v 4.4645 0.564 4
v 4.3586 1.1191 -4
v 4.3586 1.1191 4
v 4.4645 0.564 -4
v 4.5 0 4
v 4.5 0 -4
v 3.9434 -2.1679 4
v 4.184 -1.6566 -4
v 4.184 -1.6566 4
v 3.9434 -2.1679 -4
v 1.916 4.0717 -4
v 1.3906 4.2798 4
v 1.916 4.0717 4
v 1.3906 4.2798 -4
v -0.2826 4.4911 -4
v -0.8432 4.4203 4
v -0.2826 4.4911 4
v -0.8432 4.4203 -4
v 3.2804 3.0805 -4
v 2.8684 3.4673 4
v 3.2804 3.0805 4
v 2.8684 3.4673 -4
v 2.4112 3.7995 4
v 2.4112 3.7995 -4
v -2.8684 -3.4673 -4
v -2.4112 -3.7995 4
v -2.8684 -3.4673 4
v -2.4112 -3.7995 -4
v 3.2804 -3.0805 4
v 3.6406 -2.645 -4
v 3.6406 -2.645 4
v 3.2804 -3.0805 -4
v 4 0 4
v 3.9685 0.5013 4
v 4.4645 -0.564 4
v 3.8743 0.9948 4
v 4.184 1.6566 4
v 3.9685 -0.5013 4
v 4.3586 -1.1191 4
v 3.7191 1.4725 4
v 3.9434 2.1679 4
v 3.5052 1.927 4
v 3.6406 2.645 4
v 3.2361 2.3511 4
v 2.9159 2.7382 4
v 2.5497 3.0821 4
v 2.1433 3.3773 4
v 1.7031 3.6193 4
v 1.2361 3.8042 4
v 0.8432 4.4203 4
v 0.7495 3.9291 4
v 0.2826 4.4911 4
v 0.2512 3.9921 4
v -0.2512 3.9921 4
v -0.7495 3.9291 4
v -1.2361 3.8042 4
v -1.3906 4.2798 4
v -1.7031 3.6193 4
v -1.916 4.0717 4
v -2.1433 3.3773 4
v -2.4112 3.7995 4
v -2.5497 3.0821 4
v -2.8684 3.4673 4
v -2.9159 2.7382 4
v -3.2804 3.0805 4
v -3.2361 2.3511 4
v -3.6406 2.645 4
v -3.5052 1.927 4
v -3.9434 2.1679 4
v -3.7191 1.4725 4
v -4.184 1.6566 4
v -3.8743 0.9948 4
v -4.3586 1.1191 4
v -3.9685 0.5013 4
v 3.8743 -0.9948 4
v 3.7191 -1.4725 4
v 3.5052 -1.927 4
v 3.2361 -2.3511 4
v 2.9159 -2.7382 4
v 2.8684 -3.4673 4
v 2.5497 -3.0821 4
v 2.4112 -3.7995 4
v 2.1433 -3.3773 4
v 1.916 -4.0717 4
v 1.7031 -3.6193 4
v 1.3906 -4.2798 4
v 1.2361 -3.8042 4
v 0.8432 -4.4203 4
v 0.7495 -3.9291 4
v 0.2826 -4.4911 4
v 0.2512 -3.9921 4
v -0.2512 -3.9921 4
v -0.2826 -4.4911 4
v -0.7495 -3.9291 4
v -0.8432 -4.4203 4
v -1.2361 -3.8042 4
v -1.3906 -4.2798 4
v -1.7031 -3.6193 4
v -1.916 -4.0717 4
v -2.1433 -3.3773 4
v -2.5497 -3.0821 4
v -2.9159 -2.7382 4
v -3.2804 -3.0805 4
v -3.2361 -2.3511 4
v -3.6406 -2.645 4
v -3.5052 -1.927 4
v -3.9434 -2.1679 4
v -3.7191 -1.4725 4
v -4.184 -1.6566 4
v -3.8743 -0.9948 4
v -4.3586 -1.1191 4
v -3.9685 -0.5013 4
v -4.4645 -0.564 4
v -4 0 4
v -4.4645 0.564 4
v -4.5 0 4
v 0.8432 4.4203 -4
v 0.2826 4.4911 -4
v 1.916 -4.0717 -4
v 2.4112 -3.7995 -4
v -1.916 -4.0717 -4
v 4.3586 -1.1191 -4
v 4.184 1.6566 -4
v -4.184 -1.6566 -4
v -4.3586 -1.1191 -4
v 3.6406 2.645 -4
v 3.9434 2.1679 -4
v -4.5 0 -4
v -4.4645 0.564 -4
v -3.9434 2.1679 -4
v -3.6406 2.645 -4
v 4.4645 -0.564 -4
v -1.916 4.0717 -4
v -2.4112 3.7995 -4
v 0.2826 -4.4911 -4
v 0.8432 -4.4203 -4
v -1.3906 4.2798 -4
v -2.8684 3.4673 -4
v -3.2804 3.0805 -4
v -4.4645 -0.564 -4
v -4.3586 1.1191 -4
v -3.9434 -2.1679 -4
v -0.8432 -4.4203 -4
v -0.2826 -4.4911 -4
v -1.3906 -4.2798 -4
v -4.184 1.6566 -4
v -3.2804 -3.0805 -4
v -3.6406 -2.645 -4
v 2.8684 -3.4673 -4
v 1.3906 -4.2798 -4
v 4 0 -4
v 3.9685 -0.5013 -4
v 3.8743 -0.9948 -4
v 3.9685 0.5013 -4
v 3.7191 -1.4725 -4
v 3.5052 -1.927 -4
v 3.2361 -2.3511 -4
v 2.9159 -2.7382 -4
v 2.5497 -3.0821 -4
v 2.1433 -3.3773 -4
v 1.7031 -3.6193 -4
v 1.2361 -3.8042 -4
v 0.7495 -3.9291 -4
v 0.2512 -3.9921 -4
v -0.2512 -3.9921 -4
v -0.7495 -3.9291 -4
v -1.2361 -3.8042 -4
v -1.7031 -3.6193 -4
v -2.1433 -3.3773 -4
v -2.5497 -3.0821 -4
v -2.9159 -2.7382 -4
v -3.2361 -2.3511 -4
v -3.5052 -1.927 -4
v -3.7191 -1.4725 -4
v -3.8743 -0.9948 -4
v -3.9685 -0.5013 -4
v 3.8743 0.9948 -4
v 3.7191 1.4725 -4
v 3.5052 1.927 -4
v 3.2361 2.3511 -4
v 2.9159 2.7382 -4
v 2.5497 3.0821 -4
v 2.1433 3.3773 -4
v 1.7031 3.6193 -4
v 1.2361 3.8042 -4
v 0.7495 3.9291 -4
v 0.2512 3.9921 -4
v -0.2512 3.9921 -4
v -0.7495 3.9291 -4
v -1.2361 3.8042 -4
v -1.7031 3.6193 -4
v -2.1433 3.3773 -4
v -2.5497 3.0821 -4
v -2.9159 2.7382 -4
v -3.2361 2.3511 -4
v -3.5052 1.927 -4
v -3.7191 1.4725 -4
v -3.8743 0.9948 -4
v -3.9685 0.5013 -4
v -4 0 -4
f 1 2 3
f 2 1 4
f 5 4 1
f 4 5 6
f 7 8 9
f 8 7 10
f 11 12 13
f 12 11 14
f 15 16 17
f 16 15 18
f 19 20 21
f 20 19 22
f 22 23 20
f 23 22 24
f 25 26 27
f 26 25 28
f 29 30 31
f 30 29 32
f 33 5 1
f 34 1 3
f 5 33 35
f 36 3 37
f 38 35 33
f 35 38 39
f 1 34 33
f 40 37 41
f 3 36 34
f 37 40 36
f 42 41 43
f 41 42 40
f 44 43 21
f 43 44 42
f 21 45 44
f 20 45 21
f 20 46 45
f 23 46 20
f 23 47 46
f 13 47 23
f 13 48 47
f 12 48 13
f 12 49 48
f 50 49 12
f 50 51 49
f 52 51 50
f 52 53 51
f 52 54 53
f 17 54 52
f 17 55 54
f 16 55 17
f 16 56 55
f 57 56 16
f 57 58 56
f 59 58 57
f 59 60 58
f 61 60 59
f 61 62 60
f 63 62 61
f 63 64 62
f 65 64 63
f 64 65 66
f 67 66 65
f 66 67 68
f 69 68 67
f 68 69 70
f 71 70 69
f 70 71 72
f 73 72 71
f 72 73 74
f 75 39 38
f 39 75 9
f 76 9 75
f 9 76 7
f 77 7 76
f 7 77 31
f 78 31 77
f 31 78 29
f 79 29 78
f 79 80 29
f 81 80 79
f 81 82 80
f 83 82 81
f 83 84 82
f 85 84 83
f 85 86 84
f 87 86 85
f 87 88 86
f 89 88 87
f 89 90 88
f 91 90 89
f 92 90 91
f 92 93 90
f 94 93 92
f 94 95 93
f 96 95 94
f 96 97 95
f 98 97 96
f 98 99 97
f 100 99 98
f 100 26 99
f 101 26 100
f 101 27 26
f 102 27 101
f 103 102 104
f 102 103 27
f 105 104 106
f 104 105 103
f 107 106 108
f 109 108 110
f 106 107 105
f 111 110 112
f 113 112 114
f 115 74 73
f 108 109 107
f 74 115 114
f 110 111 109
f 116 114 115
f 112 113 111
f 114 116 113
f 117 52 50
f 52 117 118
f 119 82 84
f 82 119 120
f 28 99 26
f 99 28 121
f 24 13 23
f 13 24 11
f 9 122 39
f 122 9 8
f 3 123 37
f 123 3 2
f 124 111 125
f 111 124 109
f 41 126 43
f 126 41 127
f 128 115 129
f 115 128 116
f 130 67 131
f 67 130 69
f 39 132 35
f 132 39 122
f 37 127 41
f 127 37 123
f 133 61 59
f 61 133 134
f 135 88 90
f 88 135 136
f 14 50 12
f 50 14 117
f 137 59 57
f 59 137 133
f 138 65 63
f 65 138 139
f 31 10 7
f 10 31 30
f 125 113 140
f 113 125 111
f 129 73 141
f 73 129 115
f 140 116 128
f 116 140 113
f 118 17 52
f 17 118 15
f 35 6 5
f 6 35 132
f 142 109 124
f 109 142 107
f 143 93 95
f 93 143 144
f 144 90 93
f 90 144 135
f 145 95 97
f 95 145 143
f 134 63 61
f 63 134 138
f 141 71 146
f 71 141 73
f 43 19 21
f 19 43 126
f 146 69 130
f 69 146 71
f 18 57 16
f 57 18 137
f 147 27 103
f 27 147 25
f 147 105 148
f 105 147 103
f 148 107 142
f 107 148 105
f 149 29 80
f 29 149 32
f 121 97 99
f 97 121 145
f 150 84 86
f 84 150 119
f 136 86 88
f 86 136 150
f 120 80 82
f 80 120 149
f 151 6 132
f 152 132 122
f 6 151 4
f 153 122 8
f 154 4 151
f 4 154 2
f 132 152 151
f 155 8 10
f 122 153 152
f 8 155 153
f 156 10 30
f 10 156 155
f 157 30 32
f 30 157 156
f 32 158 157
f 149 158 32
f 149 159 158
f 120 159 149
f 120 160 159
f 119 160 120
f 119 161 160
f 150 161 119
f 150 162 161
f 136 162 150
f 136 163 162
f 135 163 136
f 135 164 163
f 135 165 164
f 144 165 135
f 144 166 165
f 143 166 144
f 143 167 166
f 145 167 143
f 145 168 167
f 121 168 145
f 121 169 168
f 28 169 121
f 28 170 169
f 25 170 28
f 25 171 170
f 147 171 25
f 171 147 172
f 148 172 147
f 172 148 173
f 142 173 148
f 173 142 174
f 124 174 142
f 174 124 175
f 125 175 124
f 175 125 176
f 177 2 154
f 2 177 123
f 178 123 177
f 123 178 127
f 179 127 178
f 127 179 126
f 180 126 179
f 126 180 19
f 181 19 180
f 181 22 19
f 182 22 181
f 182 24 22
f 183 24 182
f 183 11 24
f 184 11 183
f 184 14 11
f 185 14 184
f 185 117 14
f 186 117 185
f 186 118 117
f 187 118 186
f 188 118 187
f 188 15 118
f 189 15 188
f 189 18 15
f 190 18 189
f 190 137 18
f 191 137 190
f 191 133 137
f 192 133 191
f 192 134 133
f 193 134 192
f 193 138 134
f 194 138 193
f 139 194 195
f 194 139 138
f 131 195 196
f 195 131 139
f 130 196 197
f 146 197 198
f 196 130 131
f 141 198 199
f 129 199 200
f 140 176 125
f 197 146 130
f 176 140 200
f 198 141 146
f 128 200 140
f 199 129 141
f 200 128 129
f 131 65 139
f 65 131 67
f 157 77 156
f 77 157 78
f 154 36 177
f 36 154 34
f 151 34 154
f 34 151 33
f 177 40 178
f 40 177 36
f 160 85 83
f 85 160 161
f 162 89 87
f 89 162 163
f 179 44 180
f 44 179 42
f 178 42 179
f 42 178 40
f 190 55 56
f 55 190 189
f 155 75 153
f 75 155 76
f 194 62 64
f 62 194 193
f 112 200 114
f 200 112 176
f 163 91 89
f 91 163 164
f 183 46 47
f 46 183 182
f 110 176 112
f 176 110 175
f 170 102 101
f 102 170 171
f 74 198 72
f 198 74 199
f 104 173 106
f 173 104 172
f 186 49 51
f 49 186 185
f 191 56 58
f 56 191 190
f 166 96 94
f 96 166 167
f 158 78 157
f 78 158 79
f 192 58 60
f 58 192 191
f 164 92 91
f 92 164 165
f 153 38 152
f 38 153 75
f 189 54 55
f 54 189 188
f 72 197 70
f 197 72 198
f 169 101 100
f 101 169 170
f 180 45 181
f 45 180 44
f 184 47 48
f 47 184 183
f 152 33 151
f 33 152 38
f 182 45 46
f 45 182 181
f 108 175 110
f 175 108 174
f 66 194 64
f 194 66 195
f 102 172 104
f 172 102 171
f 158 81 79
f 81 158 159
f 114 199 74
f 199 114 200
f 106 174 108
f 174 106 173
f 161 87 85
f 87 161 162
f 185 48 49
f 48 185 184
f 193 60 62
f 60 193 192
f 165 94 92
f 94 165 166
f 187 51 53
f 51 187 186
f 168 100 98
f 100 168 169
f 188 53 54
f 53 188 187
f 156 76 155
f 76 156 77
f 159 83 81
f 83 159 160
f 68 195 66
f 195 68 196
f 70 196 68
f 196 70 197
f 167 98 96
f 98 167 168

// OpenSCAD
$fn = 50;


difference() {
	union() {
		translate(v = [0, 0, -4.0000000000]) {
			cylinder(h = 8, r = 4.5000000000);
		}
	}
	union() {
		translate(v = [0, 0, -100.0000000000]) {
			cylinder(h = 200, r = 4.0000000000);
		}
	}
}
